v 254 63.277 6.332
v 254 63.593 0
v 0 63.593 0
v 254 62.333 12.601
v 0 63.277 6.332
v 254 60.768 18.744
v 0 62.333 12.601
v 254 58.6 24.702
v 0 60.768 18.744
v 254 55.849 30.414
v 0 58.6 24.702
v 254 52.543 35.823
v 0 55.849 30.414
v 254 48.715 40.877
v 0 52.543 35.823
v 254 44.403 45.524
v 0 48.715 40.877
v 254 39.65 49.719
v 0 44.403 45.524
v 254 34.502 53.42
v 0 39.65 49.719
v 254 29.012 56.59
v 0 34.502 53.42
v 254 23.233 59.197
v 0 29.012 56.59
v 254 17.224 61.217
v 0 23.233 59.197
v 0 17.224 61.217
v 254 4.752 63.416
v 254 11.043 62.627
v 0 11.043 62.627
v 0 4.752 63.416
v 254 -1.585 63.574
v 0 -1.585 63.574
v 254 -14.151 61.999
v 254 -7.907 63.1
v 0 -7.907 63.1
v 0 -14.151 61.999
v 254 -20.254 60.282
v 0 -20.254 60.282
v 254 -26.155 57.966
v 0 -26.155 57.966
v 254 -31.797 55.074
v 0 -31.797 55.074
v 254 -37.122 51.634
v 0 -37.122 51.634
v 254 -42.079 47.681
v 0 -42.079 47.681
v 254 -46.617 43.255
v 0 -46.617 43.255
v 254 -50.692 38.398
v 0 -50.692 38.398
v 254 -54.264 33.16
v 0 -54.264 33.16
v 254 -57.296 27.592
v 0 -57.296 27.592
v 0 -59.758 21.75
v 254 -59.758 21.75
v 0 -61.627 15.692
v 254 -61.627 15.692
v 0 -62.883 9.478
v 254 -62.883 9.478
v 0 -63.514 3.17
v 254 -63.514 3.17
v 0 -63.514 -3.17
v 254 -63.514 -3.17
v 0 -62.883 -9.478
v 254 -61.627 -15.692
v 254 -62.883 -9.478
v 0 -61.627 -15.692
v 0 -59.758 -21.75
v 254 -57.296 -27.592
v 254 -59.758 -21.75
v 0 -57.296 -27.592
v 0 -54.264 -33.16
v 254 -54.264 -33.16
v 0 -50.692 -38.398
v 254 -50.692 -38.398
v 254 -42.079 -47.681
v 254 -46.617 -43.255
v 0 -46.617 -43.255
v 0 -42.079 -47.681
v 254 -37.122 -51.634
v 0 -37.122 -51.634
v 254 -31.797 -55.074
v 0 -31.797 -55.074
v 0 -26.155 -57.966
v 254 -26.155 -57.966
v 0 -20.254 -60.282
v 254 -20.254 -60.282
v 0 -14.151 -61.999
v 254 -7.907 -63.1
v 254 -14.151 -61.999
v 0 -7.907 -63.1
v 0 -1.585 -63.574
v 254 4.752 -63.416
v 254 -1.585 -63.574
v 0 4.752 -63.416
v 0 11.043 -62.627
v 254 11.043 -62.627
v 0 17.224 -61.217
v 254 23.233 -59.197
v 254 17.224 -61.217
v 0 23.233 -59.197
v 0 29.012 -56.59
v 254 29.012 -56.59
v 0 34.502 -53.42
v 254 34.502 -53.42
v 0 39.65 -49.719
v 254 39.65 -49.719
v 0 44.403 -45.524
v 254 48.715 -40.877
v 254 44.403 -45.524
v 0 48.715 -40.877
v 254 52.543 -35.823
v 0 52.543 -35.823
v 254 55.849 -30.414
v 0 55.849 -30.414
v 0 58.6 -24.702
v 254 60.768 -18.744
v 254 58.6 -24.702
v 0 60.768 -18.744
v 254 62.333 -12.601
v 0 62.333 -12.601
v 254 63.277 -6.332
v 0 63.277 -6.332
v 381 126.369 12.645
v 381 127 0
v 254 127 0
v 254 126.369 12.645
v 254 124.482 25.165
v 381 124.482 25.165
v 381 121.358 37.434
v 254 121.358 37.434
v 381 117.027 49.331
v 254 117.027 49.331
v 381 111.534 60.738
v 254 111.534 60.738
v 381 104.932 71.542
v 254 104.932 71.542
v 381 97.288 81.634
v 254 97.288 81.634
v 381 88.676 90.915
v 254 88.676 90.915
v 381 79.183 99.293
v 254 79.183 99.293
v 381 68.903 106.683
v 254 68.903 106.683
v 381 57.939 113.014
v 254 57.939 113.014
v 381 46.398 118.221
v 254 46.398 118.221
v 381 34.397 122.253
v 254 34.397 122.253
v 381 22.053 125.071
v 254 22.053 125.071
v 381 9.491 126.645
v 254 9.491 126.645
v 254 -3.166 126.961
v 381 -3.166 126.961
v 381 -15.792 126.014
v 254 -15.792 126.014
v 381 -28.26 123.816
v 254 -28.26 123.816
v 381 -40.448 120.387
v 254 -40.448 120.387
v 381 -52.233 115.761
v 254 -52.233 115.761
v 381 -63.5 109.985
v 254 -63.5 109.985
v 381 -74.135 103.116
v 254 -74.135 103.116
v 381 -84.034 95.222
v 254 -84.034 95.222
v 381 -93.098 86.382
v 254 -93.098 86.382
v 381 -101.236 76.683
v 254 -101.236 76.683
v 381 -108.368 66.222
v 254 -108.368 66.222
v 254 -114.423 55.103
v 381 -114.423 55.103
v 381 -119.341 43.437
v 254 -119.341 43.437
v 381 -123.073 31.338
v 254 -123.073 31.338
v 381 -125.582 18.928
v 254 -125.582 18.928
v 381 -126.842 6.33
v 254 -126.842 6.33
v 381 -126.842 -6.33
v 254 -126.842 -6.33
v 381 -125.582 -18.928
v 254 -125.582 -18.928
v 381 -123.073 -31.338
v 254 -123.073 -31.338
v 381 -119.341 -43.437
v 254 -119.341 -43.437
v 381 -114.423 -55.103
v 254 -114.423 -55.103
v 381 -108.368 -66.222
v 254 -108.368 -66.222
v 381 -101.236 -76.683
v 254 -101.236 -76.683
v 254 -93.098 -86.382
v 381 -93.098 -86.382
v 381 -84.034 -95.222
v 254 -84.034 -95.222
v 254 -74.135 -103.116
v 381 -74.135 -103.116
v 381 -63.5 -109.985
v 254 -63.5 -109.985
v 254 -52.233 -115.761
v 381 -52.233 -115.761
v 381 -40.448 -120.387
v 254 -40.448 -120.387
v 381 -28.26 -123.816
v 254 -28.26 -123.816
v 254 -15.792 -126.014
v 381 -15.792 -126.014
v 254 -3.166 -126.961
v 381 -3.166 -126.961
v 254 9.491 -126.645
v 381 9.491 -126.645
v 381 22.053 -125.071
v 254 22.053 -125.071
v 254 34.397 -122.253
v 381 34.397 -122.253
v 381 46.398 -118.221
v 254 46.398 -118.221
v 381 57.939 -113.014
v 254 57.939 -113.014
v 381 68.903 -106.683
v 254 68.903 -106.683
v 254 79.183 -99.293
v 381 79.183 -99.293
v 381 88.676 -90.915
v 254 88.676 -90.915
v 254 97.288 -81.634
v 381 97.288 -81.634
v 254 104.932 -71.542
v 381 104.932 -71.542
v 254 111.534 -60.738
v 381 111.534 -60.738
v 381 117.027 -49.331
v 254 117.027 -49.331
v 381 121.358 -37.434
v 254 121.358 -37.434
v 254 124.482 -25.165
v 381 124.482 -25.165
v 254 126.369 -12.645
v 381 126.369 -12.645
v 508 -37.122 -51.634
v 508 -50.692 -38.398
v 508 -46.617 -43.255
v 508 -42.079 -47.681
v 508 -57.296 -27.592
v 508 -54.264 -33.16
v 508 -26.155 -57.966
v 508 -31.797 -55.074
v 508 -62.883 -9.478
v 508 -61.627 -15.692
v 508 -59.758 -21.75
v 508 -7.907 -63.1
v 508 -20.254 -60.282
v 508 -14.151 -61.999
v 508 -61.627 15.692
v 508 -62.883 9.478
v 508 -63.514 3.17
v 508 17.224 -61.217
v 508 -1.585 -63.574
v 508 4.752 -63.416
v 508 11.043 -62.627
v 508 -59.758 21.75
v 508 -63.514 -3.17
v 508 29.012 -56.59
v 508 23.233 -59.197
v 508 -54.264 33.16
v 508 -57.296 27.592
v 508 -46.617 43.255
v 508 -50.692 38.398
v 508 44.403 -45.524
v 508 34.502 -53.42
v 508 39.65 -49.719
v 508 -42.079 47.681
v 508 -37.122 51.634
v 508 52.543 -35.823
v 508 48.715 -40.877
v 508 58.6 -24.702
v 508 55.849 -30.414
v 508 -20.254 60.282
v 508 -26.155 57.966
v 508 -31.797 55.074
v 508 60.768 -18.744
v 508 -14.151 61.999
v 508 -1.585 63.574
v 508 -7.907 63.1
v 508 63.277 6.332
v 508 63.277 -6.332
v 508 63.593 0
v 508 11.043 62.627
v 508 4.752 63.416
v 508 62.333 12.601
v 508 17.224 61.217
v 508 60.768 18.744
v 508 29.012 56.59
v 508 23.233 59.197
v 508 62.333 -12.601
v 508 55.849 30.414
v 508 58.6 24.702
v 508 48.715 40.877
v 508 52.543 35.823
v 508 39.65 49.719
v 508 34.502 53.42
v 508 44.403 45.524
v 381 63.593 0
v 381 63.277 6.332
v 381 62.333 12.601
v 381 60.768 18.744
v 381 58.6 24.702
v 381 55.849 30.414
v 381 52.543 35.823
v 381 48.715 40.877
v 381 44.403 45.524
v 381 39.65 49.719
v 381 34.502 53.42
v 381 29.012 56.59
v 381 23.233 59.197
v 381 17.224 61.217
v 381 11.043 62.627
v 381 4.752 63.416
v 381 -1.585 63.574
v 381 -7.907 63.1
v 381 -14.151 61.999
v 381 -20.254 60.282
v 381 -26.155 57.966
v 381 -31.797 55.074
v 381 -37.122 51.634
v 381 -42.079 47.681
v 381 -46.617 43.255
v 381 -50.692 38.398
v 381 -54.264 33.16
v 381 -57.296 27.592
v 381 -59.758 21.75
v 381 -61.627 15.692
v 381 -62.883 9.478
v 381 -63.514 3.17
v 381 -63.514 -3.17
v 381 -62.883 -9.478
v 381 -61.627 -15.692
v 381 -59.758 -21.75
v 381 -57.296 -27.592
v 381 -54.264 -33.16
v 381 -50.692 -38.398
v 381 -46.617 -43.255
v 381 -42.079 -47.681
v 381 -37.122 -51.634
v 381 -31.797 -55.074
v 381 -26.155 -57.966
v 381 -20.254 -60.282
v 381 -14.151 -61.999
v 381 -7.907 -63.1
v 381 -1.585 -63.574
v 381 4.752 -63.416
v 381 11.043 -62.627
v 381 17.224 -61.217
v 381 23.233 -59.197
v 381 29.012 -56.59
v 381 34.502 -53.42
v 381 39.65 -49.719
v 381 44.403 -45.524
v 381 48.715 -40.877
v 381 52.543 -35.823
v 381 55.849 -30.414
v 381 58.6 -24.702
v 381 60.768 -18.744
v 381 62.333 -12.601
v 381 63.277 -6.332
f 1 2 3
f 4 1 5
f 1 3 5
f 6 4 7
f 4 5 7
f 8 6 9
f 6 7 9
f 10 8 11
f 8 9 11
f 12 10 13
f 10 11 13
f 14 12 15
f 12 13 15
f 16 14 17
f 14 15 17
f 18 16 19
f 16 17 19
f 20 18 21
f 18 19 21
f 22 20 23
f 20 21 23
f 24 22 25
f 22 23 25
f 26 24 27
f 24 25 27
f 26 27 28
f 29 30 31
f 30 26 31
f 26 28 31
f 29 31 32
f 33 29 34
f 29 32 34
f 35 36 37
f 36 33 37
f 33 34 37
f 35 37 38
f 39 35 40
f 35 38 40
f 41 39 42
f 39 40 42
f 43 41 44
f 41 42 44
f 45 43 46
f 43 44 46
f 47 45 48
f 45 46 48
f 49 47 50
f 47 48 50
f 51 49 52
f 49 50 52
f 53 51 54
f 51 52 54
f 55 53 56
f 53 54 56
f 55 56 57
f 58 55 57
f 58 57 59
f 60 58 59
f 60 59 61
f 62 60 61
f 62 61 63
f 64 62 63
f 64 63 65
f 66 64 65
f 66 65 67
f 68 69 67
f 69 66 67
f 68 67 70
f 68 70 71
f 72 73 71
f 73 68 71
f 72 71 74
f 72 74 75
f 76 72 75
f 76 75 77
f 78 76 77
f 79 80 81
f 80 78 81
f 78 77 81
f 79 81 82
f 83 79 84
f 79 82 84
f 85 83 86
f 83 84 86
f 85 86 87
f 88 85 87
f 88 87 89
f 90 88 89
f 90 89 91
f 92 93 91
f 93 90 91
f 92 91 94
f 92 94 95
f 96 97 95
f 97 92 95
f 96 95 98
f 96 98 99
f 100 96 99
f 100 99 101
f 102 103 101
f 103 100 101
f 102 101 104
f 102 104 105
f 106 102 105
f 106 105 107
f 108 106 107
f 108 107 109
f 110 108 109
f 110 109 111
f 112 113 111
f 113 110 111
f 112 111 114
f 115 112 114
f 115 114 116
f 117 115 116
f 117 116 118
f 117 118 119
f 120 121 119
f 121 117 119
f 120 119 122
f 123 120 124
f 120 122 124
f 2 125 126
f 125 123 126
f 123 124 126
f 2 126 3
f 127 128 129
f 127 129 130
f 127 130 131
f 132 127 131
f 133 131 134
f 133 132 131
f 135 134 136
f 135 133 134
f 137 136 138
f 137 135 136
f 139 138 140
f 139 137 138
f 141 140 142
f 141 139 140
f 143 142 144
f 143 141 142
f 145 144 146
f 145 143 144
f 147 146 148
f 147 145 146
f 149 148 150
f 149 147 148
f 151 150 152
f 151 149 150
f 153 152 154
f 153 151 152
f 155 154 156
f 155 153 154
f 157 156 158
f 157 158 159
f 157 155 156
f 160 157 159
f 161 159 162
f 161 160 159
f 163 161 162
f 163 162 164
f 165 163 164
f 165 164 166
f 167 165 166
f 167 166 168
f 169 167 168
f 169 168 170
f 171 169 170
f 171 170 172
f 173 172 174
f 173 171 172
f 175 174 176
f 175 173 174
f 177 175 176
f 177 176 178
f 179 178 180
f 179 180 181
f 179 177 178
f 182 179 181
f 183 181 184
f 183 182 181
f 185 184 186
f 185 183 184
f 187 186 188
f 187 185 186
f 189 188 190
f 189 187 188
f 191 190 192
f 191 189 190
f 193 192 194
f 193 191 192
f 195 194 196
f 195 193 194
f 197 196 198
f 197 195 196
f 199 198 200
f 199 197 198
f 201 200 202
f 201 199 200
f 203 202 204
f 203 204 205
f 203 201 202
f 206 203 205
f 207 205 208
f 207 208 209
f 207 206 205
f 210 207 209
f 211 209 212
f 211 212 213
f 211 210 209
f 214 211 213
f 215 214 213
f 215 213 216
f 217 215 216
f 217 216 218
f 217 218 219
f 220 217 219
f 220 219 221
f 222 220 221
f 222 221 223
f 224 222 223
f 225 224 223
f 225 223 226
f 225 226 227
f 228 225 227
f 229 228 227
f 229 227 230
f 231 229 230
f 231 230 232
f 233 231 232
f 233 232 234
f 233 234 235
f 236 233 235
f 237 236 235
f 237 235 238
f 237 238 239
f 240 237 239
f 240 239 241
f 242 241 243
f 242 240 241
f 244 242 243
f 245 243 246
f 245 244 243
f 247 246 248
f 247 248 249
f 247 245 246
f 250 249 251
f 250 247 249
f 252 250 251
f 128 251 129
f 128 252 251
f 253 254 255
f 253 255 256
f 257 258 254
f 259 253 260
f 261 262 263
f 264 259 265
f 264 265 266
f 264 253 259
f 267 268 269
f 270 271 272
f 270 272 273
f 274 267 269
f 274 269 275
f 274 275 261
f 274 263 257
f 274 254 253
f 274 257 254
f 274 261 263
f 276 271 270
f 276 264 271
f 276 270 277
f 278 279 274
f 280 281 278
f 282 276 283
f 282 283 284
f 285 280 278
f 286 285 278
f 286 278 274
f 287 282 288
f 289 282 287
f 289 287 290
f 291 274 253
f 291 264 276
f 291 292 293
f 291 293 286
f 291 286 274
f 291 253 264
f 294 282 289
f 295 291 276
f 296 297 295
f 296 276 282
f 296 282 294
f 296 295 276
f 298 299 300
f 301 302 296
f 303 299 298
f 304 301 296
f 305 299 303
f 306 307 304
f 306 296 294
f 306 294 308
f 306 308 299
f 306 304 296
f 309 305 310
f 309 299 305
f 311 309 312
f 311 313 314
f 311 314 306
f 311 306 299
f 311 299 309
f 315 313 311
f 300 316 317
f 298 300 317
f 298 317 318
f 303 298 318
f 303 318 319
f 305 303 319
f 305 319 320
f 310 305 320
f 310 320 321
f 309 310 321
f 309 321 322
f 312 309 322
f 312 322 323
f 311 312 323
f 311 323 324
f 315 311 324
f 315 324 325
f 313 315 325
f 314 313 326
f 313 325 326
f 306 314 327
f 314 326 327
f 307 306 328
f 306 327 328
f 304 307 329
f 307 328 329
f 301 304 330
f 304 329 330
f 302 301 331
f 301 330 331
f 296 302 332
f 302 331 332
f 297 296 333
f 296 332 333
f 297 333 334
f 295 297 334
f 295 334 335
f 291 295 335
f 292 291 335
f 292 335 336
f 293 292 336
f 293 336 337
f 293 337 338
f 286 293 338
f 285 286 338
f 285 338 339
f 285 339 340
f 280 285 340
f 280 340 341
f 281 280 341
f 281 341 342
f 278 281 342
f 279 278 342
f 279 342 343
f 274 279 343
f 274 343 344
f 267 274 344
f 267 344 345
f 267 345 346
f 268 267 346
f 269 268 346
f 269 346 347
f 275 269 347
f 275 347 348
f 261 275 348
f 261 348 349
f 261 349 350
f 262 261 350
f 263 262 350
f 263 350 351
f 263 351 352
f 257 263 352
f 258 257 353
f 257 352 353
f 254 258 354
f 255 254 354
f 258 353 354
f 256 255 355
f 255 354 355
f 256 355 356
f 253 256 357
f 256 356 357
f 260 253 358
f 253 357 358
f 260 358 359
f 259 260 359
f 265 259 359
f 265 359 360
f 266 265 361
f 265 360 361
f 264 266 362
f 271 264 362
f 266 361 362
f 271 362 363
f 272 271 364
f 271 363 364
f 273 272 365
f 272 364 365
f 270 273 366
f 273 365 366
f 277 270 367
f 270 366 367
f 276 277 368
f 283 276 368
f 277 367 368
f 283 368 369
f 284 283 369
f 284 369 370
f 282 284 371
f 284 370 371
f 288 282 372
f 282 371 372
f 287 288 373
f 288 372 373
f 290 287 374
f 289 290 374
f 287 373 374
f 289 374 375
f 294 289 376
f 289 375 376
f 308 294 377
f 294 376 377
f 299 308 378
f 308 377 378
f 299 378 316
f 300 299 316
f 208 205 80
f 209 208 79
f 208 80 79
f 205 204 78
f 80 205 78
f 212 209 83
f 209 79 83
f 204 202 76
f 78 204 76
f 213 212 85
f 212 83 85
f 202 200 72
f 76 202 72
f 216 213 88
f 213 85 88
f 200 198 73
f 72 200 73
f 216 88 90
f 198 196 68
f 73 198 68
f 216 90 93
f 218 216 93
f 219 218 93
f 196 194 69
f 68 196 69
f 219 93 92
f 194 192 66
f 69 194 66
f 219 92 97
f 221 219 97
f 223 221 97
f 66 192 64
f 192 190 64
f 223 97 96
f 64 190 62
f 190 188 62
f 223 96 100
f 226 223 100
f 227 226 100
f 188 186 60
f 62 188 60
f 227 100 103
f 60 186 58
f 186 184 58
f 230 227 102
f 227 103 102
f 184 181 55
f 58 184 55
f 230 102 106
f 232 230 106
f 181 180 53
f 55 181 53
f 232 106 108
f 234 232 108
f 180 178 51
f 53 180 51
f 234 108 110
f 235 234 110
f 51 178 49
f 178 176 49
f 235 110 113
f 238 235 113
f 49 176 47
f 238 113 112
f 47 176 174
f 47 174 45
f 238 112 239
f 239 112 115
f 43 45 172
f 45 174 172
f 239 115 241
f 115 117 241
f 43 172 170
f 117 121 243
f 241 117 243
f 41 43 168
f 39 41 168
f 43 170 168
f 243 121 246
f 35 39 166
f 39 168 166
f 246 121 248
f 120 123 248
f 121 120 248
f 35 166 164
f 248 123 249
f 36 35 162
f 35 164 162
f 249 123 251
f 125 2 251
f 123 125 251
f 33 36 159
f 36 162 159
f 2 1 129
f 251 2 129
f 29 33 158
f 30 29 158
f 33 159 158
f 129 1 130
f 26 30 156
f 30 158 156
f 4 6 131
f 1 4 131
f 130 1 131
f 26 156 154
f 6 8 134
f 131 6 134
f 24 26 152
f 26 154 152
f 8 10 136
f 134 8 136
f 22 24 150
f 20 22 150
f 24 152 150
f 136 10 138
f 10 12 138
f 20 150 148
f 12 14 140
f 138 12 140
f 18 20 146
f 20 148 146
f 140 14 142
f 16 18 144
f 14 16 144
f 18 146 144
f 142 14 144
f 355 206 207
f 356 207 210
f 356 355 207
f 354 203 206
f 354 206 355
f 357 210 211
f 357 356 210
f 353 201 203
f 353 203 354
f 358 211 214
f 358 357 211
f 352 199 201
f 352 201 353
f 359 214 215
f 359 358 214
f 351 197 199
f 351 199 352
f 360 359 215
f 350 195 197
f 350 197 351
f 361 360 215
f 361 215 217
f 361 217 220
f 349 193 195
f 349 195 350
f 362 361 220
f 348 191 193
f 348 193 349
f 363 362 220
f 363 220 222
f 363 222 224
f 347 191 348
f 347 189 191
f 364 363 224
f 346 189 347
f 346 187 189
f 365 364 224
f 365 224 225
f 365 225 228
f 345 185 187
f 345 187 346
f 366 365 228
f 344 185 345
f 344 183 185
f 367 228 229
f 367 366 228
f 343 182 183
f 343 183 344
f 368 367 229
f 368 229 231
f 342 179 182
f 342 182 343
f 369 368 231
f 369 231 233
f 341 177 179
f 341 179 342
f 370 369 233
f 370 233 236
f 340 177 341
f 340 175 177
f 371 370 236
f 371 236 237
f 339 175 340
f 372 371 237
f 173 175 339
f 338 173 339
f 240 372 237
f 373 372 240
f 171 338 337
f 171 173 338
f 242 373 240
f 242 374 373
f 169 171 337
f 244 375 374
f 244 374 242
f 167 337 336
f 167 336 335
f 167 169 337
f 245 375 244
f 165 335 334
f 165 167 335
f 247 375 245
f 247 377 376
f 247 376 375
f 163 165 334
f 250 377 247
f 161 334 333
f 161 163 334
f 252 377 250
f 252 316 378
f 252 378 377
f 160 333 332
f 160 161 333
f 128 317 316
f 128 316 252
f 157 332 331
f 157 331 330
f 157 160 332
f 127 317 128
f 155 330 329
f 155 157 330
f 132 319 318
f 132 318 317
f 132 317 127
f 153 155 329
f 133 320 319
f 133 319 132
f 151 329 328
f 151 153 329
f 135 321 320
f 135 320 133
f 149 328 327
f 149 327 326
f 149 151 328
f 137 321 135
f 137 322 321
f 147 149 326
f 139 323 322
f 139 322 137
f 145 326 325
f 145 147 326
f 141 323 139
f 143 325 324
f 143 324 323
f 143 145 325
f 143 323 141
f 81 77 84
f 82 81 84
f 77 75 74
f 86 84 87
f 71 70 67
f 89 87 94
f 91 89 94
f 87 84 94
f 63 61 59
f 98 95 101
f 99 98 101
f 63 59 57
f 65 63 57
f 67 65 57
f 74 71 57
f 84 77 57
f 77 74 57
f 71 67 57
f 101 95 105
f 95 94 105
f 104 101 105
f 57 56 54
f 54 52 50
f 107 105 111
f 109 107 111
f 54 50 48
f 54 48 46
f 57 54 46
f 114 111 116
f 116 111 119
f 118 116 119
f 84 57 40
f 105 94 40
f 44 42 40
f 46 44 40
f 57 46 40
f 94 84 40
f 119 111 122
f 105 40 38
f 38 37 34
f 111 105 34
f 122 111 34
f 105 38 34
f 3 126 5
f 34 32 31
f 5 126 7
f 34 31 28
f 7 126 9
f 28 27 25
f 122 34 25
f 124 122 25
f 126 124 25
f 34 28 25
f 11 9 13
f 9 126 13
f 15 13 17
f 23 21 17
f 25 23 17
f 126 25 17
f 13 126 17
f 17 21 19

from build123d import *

# Parameters (mm, degrees)
F0_R     = 63.593416
F1_DEPTH = 508
F3_R     = 127
F4_DEPTH = 127


with BuildPart() as f1:
    # F0 (on Right) → F1 (new body)
    with BuildSketch(Plane.YZ):
        Circle(F0_R)
    extrude(amount=F1_DEPTH)

    # F3 (on offset) → F4 (join)
    with BuildSketch(Plane.YZ.offset(381)):
        Circle(F3_R)
    extrude(amount=-F4_DEPTH)


solid = f1.part
